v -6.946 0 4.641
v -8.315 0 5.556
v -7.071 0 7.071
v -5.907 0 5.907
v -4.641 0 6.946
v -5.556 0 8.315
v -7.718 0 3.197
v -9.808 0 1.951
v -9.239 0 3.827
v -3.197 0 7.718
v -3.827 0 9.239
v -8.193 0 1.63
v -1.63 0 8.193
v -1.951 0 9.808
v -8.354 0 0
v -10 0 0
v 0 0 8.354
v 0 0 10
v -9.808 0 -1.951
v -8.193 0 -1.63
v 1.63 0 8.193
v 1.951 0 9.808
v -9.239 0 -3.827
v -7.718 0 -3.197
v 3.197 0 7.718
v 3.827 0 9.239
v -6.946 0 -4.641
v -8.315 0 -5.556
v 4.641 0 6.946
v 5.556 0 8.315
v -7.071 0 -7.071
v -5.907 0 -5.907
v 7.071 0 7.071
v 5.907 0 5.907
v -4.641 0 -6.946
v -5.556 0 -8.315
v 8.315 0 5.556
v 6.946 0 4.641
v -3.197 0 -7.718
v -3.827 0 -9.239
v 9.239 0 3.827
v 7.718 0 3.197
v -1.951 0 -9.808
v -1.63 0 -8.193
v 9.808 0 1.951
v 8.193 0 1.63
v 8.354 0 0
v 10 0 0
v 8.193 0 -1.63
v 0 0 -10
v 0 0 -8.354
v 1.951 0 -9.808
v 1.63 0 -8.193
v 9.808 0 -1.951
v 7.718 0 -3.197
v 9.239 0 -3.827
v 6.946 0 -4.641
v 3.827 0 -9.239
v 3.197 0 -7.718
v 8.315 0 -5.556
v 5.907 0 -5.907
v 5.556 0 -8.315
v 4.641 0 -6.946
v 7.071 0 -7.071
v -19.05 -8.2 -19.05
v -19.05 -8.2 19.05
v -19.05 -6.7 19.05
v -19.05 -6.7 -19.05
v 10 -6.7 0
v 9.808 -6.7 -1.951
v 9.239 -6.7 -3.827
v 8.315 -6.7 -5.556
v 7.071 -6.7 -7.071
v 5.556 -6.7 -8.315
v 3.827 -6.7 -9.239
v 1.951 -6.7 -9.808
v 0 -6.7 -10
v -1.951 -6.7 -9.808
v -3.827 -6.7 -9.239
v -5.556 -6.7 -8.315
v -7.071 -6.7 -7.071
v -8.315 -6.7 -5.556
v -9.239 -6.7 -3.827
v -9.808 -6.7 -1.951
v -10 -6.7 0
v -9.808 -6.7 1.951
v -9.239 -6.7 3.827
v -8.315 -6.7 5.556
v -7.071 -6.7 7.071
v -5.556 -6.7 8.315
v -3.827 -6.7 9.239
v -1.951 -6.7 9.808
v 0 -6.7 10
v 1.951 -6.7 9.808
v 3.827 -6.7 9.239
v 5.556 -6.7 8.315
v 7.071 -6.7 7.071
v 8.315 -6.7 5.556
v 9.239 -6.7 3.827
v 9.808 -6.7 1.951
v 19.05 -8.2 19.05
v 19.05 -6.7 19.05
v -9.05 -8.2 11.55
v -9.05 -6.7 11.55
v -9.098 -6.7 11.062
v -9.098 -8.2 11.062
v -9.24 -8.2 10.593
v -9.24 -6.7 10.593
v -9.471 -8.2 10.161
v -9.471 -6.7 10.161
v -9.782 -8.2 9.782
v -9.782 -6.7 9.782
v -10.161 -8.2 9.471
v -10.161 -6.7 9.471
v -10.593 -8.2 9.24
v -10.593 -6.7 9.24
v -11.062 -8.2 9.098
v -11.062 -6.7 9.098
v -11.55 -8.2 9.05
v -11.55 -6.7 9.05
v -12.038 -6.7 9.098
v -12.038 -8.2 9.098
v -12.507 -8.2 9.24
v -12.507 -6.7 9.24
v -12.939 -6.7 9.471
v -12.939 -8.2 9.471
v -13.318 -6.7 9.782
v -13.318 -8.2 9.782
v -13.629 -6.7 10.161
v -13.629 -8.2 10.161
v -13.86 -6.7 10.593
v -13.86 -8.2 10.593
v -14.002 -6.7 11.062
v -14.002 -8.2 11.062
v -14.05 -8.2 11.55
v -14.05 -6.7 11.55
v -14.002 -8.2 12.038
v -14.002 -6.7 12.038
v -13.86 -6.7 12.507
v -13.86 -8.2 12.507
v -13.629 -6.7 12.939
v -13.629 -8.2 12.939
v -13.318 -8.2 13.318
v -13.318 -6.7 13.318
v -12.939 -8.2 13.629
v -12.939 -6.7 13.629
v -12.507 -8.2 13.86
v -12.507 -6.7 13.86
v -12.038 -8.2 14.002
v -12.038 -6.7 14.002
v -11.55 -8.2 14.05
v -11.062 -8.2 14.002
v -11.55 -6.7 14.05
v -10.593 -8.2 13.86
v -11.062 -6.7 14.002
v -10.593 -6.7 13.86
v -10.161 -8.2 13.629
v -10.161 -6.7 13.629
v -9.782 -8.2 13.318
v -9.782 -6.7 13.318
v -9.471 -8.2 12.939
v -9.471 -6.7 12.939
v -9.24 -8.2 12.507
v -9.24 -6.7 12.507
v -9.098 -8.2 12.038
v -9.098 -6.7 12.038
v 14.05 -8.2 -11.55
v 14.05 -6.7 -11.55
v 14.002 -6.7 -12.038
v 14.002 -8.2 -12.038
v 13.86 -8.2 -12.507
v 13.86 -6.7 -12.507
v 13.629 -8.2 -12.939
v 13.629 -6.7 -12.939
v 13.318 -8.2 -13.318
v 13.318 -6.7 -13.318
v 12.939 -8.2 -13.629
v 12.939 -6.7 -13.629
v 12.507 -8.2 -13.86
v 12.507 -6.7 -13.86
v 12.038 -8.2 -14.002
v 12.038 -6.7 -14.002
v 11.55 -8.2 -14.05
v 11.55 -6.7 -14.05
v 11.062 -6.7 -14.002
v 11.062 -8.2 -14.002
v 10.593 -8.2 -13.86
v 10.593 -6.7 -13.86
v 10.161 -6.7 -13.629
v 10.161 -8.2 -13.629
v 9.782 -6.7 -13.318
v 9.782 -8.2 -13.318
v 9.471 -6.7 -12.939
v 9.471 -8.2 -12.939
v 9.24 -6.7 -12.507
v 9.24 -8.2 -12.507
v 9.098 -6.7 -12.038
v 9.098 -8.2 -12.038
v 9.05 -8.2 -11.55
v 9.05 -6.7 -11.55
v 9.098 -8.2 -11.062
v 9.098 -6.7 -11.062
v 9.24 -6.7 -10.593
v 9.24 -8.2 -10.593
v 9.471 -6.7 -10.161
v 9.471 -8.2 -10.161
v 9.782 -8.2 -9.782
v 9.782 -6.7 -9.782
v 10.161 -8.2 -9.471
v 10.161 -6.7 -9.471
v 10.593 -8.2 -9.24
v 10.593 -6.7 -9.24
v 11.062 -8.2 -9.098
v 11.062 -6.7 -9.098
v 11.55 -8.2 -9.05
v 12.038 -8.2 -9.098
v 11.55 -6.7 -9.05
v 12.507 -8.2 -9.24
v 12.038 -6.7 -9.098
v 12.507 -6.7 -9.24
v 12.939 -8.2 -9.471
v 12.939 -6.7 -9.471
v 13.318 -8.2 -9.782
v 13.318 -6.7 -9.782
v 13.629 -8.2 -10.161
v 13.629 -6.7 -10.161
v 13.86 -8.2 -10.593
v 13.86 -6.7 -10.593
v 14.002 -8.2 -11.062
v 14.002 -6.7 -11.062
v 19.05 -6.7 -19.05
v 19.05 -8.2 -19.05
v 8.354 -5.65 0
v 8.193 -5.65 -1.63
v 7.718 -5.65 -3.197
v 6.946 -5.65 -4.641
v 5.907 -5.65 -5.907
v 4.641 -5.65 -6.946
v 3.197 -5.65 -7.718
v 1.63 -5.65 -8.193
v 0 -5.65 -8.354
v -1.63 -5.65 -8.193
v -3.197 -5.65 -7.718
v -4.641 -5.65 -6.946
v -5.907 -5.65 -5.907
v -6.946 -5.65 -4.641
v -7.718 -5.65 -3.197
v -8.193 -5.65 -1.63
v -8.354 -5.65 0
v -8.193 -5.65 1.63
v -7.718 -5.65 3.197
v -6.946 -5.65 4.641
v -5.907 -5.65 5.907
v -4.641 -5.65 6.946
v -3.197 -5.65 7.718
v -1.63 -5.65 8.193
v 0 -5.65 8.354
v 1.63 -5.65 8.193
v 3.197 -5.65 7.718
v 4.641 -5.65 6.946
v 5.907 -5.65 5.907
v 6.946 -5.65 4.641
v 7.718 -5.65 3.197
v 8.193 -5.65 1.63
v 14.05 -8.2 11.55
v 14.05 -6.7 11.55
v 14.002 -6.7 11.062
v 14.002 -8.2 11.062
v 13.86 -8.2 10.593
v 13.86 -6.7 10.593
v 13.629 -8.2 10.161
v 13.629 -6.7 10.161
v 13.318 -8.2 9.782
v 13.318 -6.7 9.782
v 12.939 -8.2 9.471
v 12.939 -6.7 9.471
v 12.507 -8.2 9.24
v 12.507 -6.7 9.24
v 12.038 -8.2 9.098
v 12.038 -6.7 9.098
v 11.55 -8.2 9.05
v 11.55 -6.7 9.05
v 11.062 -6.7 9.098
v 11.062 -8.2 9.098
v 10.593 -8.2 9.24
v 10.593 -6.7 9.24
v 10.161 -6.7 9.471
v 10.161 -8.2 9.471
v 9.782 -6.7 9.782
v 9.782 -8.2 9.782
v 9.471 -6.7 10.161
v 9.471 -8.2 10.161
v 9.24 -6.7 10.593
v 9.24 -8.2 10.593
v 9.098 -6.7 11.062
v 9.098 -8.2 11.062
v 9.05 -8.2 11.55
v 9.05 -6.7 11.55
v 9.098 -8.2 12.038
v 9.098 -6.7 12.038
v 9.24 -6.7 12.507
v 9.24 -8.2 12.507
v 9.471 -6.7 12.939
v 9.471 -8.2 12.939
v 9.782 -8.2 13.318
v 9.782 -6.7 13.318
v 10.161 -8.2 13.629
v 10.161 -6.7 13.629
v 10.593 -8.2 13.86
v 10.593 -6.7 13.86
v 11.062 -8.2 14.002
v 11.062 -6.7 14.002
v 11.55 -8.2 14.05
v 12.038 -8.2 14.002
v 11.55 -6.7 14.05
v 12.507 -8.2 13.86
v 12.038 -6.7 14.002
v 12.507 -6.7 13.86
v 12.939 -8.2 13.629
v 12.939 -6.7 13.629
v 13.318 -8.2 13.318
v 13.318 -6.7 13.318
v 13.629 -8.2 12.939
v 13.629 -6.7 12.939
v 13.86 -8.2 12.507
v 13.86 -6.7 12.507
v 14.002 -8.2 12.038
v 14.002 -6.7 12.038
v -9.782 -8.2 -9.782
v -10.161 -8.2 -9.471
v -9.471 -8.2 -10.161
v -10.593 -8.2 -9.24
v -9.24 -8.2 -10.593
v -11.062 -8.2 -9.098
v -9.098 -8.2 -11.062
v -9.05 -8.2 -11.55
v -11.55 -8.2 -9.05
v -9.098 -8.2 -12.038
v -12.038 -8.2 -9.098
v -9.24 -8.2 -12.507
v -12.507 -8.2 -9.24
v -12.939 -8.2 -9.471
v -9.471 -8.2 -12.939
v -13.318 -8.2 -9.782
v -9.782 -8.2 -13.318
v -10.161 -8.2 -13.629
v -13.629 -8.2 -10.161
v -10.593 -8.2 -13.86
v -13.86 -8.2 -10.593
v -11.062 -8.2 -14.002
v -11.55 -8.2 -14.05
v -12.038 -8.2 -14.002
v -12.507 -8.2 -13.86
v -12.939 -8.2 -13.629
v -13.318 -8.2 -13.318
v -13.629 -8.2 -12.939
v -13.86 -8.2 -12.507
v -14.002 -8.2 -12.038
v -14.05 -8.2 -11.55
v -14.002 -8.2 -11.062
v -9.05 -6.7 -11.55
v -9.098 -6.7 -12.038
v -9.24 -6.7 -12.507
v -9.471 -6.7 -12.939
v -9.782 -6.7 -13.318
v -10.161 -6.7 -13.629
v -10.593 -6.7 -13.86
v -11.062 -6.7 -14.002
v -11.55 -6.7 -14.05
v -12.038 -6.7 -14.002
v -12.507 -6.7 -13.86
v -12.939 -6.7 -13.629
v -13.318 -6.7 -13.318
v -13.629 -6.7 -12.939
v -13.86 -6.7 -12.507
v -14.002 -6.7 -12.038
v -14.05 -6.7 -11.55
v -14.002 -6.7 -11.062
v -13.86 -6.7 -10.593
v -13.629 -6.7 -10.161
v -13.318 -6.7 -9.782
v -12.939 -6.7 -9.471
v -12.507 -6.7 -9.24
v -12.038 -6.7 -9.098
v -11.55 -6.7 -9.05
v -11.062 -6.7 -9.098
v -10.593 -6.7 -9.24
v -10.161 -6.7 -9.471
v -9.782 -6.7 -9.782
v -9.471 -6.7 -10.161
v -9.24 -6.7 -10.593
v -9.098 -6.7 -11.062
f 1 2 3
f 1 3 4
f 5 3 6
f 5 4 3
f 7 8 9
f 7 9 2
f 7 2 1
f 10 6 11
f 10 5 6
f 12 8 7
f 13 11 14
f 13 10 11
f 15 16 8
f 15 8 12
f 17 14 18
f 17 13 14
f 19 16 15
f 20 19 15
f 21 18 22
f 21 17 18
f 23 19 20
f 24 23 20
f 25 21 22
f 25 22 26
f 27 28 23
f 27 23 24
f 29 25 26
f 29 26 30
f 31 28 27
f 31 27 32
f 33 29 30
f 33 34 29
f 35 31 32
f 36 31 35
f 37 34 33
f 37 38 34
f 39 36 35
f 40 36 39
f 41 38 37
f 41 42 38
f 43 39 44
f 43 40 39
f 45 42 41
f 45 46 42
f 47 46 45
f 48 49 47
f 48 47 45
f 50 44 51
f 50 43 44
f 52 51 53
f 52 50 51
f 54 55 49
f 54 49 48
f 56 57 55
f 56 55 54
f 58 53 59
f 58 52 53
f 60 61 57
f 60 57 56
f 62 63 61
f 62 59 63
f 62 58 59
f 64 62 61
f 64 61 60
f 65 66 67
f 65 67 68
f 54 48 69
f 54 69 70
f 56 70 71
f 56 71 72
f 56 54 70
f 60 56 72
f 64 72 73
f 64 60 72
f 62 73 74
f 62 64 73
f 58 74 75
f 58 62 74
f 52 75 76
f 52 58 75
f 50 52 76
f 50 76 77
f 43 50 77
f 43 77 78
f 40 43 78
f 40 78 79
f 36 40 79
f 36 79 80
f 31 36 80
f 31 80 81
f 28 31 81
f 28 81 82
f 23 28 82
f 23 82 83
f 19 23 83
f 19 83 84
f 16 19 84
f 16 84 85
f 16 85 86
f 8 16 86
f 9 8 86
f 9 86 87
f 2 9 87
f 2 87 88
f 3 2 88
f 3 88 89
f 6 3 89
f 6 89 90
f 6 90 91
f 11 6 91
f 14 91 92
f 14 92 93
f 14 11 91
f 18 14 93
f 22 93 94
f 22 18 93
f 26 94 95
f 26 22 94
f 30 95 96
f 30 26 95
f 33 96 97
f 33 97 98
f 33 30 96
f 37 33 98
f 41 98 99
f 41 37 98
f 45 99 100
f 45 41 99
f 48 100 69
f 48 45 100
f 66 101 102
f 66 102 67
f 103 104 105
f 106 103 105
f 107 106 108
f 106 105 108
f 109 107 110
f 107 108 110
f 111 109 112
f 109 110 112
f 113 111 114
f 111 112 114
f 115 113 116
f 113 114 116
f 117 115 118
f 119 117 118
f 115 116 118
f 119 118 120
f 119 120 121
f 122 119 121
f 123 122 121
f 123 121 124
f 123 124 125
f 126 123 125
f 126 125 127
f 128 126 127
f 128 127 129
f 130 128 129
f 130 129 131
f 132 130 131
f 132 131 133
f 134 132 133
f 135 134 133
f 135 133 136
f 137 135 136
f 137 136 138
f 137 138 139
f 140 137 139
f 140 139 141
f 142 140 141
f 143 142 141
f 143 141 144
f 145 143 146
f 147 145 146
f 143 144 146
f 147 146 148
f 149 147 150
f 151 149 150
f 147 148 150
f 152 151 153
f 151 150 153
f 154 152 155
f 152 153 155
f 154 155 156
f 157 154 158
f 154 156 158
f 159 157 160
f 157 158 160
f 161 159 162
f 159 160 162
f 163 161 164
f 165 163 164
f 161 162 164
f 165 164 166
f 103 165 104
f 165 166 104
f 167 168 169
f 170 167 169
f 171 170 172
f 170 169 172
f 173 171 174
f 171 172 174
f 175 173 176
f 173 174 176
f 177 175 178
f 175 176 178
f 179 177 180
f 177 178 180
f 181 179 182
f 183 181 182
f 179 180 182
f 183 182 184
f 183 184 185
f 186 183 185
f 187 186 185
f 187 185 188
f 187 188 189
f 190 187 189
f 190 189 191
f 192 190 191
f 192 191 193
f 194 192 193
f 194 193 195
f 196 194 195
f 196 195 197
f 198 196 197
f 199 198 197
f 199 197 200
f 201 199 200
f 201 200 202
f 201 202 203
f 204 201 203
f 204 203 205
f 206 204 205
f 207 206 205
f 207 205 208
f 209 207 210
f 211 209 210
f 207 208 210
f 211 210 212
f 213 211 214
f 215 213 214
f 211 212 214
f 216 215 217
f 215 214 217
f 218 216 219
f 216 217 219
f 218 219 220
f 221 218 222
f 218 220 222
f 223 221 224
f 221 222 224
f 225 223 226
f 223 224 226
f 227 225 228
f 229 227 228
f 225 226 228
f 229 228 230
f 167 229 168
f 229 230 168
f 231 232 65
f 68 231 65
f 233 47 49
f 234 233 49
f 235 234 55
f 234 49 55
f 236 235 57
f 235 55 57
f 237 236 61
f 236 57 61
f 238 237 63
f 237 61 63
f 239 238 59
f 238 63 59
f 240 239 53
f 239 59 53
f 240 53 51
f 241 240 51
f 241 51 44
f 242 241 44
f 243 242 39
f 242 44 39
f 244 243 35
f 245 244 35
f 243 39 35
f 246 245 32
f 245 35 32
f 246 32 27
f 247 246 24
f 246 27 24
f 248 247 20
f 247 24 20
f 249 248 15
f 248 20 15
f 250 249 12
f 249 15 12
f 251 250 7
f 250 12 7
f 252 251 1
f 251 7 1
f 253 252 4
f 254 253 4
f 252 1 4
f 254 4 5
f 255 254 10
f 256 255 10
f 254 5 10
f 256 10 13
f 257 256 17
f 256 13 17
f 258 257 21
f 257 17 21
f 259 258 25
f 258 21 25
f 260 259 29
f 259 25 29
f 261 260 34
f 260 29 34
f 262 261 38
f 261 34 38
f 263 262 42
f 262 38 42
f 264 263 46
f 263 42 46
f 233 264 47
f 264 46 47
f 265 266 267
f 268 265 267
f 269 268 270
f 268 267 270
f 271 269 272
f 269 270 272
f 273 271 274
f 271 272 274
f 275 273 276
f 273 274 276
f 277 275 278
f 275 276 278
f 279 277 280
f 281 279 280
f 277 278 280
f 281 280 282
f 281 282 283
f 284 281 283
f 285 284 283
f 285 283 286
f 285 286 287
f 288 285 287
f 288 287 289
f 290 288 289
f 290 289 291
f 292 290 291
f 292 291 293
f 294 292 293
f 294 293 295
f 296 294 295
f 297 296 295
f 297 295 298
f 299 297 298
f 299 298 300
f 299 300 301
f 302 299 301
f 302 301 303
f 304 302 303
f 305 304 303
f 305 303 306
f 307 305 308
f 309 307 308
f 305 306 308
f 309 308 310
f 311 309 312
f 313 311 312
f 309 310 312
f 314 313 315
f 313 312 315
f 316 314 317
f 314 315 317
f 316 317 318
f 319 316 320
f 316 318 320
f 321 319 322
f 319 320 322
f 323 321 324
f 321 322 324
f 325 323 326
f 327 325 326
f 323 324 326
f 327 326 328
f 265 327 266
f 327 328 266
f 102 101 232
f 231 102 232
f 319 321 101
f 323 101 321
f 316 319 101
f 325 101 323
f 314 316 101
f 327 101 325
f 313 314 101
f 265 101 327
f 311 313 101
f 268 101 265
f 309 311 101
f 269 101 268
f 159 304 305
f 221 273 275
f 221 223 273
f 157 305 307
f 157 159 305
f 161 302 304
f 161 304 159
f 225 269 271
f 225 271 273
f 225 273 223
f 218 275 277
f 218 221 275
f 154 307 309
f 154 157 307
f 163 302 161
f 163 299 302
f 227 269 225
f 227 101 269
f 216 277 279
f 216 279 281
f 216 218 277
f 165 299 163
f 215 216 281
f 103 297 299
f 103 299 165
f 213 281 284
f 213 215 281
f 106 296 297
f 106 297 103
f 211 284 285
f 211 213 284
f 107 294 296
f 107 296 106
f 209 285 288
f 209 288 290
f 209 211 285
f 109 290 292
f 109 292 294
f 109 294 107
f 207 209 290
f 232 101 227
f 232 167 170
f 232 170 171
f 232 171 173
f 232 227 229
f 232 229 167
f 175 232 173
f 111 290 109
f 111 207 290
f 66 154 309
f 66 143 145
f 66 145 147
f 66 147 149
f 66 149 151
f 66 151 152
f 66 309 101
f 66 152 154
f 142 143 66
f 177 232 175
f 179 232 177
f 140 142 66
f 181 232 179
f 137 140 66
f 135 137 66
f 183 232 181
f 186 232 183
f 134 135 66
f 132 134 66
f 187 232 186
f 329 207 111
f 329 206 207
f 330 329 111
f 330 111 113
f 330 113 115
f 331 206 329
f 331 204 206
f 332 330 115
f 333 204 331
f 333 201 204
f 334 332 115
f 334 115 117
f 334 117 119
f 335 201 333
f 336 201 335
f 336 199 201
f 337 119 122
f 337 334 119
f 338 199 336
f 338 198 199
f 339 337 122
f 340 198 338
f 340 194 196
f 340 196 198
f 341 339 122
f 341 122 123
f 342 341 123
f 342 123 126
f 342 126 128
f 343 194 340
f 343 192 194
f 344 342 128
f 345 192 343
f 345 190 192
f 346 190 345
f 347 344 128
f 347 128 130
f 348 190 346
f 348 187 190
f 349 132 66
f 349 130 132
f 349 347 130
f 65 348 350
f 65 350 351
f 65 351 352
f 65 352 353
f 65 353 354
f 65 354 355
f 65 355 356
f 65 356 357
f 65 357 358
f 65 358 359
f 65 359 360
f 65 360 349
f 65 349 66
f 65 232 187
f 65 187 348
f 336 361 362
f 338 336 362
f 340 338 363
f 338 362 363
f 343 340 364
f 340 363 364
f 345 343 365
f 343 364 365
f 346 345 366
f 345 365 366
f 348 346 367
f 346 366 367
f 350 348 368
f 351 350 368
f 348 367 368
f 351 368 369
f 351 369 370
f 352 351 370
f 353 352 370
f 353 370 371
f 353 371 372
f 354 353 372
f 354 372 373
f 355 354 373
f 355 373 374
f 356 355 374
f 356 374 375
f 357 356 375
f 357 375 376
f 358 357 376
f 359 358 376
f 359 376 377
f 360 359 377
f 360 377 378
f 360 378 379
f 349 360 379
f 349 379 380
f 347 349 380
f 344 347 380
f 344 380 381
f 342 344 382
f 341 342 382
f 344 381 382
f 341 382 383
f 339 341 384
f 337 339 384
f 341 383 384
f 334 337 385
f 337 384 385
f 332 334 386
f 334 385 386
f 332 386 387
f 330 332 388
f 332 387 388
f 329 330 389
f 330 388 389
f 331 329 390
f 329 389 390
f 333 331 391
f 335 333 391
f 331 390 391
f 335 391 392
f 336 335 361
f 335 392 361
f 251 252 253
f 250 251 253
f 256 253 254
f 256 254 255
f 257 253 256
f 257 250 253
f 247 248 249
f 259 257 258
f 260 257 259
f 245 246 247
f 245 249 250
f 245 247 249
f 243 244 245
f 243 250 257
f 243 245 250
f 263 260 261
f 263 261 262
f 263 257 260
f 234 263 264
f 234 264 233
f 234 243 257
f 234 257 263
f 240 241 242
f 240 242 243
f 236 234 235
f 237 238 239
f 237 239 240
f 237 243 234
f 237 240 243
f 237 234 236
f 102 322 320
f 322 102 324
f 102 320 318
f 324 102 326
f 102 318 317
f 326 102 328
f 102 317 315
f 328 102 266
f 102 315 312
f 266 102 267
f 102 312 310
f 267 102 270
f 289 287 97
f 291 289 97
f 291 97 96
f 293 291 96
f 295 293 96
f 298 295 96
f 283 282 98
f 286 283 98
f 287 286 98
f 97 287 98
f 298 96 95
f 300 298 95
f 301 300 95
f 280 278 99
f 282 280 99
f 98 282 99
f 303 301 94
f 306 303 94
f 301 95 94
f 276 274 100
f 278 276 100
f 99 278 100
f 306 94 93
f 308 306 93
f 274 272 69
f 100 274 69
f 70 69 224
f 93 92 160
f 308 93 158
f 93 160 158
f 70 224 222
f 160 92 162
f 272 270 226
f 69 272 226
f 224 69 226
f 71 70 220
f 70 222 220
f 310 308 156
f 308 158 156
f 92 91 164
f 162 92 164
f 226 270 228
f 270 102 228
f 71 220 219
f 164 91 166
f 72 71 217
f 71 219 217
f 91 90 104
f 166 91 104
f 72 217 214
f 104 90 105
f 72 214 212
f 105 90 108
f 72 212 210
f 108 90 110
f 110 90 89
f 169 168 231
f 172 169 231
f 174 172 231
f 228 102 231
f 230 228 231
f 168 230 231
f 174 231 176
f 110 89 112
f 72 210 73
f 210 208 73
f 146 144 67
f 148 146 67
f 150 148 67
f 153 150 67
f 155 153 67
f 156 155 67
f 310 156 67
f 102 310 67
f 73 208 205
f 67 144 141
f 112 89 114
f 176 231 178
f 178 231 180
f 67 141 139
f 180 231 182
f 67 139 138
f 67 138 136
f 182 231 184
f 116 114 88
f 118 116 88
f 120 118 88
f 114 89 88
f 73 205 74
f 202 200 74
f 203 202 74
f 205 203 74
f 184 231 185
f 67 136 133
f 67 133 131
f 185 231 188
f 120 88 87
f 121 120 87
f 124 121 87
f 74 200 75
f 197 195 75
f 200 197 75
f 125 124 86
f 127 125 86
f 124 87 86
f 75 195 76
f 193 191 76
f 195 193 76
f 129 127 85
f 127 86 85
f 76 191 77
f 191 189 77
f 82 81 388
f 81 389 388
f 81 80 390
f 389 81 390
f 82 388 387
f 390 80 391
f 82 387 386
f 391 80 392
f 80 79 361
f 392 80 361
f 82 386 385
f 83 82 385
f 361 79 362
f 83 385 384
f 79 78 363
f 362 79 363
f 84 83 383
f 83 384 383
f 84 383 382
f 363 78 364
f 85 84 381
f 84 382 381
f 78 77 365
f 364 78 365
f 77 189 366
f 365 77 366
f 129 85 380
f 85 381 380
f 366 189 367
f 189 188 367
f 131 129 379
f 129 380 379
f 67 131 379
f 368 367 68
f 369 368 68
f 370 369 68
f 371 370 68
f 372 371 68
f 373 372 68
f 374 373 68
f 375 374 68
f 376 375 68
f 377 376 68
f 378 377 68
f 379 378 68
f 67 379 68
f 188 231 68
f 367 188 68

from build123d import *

# Parameters (mm, degrees)
ESQUISSE1_R             = 10
BOSS_EXTRU_1_DEPTH      = 8.2
ESQUISSE2_R             = 8.354
ENL_V_MAT_EXTRU_1_DEPTH = 5.65
ESQUISSE3_W             = 38.1
ESQUISSE3_H             = 38.1
BOSS_EXTRU_3_DEPTH      = 1.5
ESQUISSE4_R             = 2.5
ENL_V_MAT_EXTRU_2_DEPTH = 2


with BuildPart() as part:
    # Esquisse1 → Boss.-Extru.1 (new body)
    with BuildSketch(Plane(origin=(0, 0, 0), x_dir=(1, 0, 0), z_dir=(0, 1, 0))):
        Circle(ESQUISSE1_R)
    extrude(amount=-BOSS_EXTRU_1_DEPTH)

    # Esquisse2 → Enlèv. mat.-Extru.1 (cut)
    with BuildSketch(Plane(origin=(0, 0, 0), x_dir=(1, 0, 0), z_dir=(0, 1, 0))):
        Circle(ESQUISSE2_R)
    extrude(amount=-ENL_V_MAT_EXTRU_1_DEPTH, mode=Mode.SUBTRACT)

    # Esquisse3 → Boss.-Extru.3 (add)
    with BuildSketch(Plane(origin=(0, -8.2, 0), x_dir=(-1, 0, 0), z_dir=(0, -1, 0))):
        Rectangle(ESQUISSE3_W, ESQUISSE3_H)
    extrude(amount=-BOSS_EXTRU_3_DEPTH)

    # Esquisse4 → Enlèv. mat.-Extru.2 (cut)
    with BuildSketch(Plane(origin=(0, -6.7, 0), x_dir=(1, 0, 0), z_dir=(0, 1, 0))):
        with Locations((-11.55, 11.55)):
            Circle(ESQUISSE4_R)
        with Locations((11.55, 11.55)):
            Circle(ESQUISSE4_R)
        with Locations((11.55, -11.55)):
            Circle(ESQUISSE4_R)
        with Locations((-11.55, -11.55)):
            Circle(ESQUISSE4_R)
    extrude(amount=-ENL_V_MAT_EXTRU_2_DEPTH, mode=Mode.SUBTRACT)


solid = part.part
